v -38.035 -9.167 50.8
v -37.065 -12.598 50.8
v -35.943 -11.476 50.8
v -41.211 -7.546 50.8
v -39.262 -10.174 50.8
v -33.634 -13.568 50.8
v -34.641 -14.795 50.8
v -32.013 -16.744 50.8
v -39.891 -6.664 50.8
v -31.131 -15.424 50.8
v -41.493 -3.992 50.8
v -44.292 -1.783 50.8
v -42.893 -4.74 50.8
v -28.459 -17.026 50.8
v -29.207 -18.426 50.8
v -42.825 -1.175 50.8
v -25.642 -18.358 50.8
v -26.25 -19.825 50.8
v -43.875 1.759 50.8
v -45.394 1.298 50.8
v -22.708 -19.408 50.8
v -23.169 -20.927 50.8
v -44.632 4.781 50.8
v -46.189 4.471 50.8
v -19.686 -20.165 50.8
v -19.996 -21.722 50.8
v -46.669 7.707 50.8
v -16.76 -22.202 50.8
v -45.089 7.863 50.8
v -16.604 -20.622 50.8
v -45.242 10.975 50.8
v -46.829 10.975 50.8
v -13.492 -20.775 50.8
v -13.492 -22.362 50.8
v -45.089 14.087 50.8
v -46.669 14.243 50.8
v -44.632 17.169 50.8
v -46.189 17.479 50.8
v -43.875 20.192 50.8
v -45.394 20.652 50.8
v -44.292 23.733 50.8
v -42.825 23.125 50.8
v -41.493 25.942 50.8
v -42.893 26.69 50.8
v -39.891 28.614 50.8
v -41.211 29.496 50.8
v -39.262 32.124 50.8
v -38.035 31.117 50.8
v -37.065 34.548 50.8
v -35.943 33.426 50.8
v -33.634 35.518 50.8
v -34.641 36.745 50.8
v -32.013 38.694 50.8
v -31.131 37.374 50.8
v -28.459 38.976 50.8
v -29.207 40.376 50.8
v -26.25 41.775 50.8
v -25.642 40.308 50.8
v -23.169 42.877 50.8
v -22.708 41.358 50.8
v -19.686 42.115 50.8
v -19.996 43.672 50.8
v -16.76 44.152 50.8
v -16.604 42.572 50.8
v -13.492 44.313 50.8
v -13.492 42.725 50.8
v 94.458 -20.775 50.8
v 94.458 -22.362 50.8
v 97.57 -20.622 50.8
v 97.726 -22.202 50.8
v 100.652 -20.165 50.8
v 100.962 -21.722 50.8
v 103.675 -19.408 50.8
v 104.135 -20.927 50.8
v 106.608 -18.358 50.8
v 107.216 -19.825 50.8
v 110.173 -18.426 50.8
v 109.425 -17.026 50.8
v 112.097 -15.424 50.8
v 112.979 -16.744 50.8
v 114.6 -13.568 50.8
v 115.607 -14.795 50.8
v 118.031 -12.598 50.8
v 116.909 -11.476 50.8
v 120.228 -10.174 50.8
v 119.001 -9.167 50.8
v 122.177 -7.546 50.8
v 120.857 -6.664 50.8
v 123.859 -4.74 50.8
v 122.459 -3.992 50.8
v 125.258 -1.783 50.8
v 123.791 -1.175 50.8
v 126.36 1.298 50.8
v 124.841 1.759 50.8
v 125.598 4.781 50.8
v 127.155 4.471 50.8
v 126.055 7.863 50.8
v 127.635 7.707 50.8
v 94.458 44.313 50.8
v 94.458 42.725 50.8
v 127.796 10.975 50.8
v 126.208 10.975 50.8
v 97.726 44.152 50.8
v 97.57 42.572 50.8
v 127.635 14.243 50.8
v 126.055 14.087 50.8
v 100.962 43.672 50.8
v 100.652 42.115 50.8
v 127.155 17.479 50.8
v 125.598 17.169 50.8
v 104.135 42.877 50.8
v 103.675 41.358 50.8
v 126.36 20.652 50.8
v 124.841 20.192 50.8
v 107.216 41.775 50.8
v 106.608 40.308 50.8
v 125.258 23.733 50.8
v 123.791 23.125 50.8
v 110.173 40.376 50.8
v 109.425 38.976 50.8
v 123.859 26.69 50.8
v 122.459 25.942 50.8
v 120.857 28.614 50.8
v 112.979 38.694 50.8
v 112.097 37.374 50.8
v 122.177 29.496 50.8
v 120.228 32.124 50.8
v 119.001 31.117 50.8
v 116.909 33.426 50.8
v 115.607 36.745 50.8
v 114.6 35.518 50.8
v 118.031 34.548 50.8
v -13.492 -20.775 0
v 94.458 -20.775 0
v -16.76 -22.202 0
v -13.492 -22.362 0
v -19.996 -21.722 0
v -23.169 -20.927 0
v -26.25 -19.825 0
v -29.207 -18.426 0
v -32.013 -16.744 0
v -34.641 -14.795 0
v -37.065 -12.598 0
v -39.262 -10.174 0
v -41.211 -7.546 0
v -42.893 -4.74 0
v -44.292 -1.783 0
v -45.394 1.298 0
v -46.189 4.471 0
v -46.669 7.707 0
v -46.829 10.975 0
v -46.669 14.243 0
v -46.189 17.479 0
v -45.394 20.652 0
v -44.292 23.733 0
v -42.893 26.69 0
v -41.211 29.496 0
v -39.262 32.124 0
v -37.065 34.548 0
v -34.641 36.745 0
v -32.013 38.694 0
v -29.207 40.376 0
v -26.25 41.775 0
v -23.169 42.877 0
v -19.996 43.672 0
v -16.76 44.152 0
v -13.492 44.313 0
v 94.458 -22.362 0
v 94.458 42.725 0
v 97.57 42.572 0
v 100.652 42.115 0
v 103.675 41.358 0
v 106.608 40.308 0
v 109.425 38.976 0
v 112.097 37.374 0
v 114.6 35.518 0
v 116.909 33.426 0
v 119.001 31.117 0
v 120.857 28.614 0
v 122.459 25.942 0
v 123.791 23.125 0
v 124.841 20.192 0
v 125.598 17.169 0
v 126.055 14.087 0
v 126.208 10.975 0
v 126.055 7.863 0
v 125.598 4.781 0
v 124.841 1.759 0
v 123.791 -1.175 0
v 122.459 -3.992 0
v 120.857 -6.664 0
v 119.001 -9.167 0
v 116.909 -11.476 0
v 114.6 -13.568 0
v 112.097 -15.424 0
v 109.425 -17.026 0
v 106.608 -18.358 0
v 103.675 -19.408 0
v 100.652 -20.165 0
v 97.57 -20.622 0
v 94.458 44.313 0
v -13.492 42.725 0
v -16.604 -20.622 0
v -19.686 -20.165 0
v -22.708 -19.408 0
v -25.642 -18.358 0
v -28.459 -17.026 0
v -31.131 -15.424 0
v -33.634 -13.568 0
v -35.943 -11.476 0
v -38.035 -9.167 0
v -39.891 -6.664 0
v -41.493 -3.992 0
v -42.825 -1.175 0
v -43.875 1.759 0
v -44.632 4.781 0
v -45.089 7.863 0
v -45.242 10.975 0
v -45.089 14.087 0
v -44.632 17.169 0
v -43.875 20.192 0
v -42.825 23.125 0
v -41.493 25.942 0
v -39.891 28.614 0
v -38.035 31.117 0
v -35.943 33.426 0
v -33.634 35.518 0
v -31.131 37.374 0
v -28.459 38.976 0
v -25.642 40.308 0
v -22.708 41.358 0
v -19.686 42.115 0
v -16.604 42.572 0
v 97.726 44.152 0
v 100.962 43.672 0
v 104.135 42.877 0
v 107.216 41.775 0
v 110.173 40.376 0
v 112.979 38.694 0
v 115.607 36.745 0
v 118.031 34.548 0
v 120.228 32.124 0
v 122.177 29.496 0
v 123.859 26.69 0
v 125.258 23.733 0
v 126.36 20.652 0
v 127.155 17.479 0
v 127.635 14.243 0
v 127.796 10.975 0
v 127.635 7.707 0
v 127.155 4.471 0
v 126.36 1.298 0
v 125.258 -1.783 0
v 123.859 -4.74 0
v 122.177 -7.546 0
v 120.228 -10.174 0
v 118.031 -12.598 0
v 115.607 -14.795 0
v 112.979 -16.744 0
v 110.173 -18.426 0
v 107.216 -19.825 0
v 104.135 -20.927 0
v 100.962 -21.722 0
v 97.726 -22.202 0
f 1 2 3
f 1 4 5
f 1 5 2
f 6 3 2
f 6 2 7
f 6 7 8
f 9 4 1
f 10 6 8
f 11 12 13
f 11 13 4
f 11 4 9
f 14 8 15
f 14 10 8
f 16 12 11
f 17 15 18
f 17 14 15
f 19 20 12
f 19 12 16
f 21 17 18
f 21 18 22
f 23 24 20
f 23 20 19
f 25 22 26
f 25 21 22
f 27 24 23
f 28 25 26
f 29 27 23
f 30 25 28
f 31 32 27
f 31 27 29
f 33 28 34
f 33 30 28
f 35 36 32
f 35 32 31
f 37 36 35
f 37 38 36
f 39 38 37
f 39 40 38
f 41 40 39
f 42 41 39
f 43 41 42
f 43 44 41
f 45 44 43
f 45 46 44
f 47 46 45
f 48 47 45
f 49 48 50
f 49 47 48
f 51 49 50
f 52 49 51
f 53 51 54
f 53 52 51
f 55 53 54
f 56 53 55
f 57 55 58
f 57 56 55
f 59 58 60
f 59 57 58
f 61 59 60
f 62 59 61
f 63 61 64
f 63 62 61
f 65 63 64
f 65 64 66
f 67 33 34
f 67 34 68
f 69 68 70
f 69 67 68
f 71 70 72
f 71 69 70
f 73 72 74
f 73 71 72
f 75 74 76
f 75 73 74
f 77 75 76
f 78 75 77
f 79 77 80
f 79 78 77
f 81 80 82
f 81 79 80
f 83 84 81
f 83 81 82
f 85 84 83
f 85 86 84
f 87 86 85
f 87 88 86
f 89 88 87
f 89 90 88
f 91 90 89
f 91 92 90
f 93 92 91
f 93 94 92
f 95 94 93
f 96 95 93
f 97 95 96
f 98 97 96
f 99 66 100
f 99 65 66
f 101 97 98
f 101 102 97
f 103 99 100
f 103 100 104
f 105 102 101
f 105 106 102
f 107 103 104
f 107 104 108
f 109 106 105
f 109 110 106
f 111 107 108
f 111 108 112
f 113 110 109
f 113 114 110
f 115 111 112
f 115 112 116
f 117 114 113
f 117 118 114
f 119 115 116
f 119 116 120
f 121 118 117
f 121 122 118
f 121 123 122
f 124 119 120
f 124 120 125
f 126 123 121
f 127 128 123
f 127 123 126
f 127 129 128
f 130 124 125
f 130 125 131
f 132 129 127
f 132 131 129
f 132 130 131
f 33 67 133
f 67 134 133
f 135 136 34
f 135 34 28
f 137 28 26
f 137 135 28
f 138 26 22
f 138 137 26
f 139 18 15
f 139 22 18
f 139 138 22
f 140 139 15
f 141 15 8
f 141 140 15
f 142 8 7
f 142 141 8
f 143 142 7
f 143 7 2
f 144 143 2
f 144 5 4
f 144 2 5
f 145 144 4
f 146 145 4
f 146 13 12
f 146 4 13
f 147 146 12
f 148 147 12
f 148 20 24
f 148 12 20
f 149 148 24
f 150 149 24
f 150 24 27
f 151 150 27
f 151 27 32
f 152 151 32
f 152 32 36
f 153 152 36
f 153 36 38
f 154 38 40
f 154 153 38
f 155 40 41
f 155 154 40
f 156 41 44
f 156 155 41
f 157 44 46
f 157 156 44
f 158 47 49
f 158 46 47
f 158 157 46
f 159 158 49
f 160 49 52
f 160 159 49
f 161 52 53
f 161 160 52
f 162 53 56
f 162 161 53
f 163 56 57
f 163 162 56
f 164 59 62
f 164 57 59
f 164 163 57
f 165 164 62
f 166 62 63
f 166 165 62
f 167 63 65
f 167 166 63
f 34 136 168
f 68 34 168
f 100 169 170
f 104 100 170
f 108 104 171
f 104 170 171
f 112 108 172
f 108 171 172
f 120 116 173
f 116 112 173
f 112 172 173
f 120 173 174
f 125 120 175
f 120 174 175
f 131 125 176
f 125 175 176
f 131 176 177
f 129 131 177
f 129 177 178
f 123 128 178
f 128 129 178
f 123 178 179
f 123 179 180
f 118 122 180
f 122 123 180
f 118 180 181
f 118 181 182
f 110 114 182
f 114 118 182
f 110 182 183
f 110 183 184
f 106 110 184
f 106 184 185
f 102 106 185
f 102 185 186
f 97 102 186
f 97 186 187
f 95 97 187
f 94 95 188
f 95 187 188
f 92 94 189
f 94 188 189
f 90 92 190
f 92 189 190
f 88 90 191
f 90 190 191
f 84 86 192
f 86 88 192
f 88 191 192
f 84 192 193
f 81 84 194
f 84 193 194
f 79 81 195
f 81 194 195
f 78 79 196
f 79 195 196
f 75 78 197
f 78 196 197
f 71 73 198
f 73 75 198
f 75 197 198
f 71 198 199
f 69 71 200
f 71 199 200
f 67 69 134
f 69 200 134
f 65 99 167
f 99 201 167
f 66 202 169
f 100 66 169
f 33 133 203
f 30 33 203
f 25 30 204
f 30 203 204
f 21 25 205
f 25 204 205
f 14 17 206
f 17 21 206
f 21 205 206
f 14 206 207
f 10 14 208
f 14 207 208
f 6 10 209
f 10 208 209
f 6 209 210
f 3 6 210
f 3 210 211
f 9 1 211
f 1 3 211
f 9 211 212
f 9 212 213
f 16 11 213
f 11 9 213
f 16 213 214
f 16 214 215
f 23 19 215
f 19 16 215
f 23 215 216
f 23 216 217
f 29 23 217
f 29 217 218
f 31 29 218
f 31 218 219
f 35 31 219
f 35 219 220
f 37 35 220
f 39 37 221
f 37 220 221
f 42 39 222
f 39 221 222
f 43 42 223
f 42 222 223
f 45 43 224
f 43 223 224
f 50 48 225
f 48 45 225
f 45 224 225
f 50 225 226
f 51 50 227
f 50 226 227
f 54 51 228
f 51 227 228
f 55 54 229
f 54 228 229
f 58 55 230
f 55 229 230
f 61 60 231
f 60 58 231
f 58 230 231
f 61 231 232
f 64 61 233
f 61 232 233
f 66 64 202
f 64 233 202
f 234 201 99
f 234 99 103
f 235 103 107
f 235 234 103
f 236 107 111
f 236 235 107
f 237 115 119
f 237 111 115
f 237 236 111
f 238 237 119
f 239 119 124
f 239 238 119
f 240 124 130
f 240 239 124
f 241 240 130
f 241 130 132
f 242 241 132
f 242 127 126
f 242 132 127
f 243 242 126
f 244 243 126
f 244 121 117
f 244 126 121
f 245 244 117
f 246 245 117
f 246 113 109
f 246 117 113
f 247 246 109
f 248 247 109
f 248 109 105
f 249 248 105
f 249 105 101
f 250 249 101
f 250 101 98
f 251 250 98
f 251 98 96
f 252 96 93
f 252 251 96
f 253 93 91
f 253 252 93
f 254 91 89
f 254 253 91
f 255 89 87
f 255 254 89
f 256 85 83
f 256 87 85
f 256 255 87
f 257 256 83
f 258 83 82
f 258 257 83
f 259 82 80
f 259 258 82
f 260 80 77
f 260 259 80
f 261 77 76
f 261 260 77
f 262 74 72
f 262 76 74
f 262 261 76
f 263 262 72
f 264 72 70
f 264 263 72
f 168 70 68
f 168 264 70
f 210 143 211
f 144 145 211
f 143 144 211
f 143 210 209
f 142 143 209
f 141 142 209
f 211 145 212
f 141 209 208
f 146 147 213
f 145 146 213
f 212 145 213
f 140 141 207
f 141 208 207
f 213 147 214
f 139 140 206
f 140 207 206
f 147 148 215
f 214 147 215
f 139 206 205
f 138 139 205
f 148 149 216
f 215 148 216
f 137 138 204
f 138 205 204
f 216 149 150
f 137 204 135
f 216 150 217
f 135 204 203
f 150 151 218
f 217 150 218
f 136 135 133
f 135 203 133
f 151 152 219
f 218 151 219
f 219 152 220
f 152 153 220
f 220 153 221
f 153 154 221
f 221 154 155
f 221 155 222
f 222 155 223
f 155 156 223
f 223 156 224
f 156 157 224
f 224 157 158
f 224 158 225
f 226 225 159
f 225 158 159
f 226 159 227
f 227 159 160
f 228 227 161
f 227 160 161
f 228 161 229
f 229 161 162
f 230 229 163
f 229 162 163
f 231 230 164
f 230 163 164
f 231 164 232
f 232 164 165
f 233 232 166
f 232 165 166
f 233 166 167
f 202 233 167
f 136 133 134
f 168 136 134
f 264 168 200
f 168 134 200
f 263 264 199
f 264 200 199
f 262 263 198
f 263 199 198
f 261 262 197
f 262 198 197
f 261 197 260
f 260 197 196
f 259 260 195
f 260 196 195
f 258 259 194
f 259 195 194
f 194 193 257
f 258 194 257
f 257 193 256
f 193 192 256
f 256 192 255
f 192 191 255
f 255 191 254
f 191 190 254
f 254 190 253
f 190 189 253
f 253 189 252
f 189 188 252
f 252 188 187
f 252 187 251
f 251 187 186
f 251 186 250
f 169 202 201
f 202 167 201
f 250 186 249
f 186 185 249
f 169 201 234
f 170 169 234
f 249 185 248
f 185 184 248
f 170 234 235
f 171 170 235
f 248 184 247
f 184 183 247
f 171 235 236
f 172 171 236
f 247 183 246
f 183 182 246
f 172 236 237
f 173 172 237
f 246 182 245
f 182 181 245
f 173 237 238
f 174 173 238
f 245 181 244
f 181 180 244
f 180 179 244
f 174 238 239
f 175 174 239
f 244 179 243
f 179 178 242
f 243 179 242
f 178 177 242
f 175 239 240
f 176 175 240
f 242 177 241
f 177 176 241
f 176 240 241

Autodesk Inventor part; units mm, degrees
ref_plane "YZ Plane" through (0, 0, 0) normal (1, 0, 0) x (0, 1, 0)
ref_plane "XZ Plane" through (0, 0, 0) normal (0, 1, 0) x (-1, 0, 0)
ref_plane "XY Plane" through (0, 0, 0) normal (0, 0, 1) x (1, 0, 0)
sketch "Sketch1" plane through (0, 0, 0) normal (0, 0, 1) x (1, 0, 0)
  arc A0 (-13.4919, 42.7251) -> (-13.4919, -20.7749) centre (-13.4919, 10.9751) ccw
  arc A1 (94.4581, -20.7749) -> (94.4581, 42.7251) centre (94.4581, 10.9751) ccw
  line L0 (-13.4919, 42.7251) -> (94.4581, 42.7251)
  line L1 (94.4581, -20.7749) -> (-13.4919, -20.7749)
  line L2 (94.4581, 44.3126) -> (-13.4919, 44.3126)
  arc A2 (-13.4919, 44.3126) -> (-13.4919, -22.3624) centre (-13.4919, 10.9751) ccw
  line L3 (-13.4919, -22.3624) -> (94.4581, -22.3624)
  arc A3 (94.4581, -22.3624) -> (94.4581, 44.3126) centre (94.4581, 10.9751) ccw
  point P0 (0, 0)
  dimension "d2" = 31.75
  dimension "d3" = 107.95
  dimension "d4" = 1.5875
extrude "Extrusion1" add sketch "Sketch1" along normal blind 50.8
equation "\"d2\" = d1"
equation "\"d3\" = d0"
equation "\"d0\" = 107.95"
equation "\"d1\" = 31.75"
properties part number "Polyurethane Belt STOCK" material "Rubber"
